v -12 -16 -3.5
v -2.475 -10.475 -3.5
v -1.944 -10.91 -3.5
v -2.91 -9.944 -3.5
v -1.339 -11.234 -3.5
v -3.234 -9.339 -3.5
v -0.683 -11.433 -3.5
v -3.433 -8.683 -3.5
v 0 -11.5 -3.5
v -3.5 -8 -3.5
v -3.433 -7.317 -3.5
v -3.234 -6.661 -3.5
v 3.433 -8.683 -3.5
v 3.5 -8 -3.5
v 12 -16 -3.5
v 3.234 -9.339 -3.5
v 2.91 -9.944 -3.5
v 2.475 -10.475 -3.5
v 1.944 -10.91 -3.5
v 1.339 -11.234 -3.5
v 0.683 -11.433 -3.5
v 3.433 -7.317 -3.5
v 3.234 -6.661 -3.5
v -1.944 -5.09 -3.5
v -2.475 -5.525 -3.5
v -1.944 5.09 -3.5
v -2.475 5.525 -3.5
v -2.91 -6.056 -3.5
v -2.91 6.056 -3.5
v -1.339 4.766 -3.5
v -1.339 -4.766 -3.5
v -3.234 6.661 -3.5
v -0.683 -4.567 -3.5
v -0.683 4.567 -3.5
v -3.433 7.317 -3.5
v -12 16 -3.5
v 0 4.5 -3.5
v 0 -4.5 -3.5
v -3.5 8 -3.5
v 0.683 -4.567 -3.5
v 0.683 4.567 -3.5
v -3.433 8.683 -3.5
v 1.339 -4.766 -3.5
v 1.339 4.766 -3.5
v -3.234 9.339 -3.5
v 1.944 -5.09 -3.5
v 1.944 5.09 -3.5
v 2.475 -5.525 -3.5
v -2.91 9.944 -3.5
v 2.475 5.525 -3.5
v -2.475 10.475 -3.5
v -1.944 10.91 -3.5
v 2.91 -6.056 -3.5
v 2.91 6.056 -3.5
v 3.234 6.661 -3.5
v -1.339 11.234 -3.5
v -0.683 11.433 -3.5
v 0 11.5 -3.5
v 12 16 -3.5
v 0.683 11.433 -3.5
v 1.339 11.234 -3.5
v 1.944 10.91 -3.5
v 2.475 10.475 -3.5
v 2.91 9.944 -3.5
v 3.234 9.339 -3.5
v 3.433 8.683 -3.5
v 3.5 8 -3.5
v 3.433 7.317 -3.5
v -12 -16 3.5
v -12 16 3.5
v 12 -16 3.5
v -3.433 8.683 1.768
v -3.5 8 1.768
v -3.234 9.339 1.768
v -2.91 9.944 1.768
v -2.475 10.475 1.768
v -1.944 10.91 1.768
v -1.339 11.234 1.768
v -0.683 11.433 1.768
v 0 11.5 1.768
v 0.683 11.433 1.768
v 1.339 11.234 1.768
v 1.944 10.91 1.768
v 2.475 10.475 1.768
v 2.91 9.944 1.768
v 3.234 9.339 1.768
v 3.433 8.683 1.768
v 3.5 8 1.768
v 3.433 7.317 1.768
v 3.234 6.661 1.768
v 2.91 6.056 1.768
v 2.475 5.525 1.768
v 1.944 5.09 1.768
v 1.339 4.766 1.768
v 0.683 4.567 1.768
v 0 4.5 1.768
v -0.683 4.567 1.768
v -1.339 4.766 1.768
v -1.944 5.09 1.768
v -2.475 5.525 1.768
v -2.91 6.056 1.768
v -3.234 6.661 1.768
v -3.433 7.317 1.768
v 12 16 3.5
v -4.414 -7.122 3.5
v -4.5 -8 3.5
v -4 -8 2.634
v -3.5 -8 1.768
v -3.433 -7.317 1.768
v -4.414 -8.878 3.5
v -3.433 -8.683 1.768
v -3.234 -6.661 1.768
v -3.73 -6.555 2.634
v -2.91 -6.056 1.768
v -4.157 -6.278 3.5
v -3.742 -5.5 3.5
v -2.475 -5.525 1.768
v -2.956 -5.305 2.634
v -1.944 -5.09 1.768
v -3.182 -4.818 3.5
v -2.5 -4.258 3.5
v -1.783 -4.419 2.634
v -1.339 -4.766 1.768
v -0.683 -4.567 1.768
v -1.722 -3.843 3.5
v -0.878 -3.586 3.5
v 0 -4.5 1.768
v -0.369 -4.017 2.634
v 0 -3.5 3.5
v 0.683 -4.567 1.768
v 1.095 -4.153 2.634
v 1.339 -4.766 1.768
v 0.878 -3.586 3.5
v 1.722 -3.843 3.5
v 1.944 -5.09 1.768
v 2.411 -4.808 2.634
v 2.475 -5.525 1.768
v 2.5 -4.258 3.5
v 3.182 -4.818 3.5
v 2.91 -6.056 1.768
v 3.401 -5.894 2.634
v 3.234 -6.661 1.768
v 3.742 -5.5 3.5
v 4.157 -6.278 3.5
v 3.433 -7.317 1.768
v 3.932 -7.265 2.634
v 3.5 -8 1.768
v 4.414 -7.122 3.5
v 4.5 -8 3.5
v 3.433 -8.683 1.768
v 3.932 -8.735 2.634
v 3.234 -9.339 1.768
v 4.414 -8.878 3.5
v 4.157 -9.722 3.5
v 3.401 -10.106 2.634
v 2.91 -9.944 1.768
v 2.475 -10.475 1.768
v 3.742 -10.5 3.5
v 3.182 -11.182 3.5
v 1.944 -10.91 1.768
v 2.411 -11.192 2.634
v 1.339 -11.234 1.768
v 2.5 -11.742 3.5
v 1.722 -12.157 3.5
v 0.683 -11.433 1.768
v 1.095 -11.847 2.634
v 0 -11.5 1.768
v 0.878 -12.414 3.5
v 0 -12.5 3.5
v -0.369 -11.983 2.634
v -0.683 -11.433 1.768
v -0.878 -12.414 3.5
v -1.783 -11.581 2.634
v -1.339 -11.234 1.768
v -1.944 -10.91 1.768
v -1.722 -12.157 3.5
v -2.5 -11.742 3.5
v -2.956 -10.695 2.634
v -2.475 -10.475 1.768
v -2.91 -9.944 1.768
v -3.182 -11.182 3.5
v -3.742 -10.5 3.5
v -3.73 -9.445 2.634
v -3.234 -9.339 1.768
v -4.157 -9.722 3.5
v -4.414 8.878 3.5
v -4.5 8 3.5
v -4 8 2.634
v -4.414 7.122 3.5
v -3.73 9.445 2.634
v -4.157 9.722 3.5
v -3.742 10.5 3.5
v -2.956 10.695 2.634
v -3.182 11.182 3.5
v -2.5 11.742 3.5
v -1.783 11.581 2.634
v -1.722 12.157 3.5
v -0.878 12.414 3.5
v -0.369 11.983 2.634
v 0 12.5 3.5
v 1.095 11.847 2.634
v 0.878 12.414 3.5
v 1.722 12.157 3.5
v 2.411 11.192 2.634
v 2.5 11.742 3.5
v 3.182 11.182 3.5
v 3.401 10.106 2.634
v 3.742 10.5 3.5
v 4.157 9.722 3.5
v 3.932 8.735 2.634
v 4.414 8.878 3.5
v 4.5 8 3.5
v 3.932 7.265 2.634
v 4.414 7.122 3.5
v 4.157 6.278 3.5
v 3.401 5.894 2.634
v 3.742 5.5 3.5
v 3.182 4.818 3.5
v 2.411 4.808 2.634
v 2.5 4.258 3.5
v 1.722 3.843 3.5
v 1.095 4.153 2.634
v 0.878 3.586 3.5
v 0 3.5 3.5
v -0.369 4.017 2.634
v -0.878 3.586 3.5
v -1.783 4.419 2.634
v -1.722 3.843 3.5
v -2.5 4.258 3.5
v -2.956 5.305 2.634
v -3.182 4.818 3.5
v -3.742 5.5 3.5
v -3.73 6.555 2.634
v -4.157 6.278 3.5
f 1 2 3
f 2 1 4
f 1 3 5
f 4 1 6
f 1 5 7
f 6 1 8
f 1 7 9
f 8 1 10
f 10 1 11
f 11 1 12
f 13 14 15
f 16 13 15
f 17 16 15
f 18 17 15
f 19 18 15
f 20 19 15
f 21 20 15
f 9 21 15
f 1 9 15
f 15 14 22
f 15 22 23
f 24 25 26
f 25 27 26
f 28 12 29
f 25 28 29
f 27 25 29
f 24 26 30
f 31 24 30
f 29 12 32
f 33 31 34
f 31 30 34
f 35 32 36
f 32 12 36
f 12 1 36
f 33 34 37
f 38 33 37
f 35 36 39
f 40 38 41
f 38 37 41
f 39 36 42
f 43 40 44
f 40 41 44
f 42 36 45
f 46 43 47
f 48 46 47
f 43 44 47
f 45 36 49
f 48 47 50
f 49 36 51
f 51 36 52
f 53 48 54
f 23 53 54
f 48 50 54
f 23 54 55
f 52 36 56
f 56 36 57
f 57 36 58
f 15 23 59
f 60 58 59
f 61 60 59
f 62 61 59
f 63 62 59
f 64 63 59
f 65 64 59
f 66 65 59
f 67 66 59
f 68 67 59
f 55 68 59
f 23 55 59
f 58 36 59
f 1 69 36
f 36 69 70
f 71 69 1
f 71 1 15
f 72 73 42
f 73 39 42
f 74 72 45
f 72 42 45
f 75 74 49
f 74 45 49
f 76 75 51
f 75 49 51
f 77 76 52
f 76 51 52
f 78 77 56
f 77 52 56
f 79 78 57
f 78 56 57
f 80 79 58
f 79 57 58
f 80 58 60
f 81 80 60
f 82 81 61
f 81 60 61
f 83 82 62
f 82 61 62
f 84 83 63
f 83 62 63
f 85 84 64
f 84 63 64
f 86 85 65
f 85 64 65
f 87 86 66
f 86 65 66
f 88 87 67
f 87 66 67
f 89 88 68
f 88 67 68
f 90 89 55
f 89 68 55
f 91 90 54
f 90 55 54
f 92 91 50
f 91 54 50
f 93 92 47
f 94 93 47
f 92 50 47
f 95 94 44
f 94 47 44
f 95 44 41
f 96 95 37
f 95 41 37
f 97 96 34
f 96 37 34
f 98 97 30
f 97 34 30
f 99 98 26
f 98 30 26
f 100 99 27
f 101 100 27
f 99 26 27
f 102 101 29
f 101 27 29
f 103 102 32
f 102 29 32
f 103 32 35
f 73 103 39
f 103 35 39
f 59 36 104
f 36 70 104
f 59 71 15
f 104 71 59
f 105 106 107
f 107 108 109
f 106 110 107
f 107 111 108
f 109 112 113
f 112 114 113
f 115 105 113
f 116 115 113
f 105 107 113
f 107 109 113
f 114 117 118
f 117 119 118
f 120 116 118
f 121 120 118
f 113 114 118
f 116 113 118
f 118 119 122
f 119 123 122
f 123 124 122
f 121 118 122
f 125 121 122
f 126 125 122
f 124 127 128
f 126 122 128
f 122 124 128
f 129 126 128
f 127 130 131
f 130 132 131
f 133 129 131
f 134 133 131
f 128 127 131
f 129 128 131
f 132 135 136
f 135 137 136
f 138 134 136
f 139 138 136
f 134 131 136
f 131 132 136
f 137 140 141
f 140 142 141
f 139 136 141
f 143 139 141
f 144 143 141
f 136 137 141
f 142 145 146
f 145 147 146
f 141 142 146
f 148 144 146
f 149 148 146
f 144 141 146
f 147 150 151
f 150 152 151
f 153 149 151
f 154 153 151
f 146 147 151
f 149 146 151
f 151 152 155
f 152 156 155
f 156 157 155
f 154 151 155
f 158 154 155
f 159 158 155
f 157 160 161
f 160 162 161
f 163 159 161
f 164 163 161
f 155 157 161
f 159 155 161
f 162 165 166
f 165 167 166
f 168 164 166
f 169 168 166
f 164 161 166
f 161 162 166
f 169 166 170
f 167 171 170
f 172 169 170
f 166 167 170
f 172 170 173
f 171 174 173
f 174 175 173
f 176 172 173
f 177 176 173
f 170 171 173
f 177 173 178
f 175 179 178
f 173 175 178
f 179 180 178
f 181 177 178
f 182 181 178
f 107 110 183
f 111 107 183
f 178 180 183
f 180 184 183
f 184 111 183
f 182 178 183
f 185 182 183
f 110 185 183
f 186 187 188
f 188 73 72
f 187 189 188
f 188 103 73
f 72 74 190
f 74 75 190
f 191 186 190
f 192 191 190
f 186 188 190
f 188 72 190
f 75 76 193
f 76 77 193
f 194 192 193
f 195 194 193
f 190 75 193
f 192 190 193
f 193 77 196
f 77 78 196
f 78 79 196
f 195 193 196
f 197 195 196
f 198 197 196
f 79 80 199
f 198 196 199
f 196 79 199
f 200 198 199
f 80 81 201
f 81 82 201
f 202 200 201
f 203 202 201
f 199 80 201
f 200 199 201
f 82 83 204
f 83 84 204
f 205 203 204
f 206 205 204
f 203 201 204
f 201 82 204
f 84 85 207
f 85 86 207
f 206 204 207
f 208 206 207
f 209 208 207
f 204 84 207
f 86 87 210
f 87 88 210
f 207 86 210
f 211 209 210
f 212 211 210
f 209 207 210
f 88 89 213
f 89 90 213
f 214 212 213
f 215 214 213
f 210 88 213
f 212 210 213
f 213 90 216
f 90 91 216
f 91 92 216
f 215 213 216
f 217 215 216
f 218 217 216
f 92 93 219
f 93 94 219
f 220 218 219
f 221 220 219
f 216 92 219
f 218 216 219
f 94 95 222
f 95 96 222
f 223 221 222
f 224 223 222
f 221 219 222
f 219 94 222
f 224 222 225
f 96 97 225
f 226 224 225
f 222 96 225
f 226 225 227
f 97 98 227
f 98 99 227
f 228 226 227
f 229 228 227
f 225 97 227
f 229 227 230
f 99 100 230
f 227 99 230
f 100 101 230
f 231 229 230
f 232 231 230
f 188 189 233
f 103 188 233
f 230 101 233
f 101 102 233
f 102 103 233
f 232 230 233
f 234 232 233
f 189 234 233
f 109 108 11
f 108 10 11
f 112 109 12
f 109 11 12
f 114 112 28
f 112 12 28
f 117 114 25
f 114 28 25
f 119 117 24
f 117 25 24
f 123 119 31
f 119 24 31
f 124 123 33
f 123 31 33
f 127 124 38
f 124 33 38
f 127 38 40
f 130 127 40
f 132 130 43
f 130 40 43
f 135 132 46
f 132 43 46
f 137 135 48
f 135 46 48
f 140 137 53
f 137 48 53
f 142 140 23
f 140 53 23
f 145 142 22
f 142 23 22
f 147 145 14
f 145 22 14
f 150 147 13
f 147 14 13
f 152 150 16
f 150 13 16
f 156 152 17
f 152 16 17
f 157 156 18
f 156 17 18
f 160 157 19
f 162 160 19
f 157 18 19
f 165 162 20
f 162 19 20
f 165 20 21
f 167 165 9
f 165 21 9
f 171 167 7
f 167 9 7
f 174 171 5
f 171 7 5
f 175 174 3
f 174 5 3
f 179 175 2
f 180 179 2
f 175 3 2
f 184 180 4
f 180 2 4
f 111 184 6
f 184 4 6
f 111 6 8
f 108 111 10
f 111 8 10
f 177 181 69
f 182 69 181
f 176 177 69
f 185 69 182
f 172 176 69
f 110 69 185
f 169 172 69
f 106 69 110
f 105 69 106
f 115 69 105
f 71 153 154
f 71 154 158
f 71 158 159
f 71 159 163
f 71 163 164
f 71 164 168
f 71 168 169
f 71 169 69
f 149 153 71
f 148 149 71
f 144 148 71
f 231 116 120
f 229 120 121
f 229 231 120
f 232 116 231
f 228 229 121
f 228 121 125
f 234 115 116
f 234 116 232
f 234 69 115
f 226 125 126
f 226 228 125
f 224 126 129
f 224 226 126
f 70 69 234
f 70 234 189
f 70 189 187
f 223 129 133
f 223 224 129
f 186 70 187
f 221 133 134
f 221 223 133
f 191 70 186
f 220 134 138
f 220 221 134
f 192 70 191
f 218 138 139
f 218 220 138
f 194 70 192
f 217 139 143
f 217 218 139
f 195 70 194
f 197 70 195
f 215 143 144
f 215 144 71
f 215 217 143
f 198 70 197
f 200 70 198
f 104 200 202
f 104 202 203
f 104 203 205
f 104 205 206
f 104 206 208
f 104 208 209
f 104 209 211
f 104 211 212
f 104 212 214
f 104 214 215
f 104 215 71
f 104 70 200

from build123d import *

# Parameters (mm, degrees)
SKETCH1_W           = 24
SKETCH1_H           = 32
BOSS_EXTRUDE1_DEPTH = 3.5
HOLE1_D             = 7
HOLE1_DEPTH         = 12
HOLE1_CSINK_D       = 9
HOLE1_CSINK_ANGLE   = 60


with BuildPart() as part:
    # Sketch1 → Boss-Extrude1 (new body, symmetric)
    with BuildSketch(Plane.XY):
        Rectangle(SKETCH1_W, SKETCH1_H)
    extrude(amount=BOSS_EXTRUDE1_DEPTH, both=True)

    # Hole1
    with Locations(Plane.XY.offset(3.5)):
        with Locations((0, 8), (0, -8)):
            CounterSinkHole(HOLE1_D / 2, HOLE1_CSINK_D / 2, depth=HOLE1_DEPTH, counter_sink_angle=HOLE1_CSINK_ANGLE)


solid = part.part
